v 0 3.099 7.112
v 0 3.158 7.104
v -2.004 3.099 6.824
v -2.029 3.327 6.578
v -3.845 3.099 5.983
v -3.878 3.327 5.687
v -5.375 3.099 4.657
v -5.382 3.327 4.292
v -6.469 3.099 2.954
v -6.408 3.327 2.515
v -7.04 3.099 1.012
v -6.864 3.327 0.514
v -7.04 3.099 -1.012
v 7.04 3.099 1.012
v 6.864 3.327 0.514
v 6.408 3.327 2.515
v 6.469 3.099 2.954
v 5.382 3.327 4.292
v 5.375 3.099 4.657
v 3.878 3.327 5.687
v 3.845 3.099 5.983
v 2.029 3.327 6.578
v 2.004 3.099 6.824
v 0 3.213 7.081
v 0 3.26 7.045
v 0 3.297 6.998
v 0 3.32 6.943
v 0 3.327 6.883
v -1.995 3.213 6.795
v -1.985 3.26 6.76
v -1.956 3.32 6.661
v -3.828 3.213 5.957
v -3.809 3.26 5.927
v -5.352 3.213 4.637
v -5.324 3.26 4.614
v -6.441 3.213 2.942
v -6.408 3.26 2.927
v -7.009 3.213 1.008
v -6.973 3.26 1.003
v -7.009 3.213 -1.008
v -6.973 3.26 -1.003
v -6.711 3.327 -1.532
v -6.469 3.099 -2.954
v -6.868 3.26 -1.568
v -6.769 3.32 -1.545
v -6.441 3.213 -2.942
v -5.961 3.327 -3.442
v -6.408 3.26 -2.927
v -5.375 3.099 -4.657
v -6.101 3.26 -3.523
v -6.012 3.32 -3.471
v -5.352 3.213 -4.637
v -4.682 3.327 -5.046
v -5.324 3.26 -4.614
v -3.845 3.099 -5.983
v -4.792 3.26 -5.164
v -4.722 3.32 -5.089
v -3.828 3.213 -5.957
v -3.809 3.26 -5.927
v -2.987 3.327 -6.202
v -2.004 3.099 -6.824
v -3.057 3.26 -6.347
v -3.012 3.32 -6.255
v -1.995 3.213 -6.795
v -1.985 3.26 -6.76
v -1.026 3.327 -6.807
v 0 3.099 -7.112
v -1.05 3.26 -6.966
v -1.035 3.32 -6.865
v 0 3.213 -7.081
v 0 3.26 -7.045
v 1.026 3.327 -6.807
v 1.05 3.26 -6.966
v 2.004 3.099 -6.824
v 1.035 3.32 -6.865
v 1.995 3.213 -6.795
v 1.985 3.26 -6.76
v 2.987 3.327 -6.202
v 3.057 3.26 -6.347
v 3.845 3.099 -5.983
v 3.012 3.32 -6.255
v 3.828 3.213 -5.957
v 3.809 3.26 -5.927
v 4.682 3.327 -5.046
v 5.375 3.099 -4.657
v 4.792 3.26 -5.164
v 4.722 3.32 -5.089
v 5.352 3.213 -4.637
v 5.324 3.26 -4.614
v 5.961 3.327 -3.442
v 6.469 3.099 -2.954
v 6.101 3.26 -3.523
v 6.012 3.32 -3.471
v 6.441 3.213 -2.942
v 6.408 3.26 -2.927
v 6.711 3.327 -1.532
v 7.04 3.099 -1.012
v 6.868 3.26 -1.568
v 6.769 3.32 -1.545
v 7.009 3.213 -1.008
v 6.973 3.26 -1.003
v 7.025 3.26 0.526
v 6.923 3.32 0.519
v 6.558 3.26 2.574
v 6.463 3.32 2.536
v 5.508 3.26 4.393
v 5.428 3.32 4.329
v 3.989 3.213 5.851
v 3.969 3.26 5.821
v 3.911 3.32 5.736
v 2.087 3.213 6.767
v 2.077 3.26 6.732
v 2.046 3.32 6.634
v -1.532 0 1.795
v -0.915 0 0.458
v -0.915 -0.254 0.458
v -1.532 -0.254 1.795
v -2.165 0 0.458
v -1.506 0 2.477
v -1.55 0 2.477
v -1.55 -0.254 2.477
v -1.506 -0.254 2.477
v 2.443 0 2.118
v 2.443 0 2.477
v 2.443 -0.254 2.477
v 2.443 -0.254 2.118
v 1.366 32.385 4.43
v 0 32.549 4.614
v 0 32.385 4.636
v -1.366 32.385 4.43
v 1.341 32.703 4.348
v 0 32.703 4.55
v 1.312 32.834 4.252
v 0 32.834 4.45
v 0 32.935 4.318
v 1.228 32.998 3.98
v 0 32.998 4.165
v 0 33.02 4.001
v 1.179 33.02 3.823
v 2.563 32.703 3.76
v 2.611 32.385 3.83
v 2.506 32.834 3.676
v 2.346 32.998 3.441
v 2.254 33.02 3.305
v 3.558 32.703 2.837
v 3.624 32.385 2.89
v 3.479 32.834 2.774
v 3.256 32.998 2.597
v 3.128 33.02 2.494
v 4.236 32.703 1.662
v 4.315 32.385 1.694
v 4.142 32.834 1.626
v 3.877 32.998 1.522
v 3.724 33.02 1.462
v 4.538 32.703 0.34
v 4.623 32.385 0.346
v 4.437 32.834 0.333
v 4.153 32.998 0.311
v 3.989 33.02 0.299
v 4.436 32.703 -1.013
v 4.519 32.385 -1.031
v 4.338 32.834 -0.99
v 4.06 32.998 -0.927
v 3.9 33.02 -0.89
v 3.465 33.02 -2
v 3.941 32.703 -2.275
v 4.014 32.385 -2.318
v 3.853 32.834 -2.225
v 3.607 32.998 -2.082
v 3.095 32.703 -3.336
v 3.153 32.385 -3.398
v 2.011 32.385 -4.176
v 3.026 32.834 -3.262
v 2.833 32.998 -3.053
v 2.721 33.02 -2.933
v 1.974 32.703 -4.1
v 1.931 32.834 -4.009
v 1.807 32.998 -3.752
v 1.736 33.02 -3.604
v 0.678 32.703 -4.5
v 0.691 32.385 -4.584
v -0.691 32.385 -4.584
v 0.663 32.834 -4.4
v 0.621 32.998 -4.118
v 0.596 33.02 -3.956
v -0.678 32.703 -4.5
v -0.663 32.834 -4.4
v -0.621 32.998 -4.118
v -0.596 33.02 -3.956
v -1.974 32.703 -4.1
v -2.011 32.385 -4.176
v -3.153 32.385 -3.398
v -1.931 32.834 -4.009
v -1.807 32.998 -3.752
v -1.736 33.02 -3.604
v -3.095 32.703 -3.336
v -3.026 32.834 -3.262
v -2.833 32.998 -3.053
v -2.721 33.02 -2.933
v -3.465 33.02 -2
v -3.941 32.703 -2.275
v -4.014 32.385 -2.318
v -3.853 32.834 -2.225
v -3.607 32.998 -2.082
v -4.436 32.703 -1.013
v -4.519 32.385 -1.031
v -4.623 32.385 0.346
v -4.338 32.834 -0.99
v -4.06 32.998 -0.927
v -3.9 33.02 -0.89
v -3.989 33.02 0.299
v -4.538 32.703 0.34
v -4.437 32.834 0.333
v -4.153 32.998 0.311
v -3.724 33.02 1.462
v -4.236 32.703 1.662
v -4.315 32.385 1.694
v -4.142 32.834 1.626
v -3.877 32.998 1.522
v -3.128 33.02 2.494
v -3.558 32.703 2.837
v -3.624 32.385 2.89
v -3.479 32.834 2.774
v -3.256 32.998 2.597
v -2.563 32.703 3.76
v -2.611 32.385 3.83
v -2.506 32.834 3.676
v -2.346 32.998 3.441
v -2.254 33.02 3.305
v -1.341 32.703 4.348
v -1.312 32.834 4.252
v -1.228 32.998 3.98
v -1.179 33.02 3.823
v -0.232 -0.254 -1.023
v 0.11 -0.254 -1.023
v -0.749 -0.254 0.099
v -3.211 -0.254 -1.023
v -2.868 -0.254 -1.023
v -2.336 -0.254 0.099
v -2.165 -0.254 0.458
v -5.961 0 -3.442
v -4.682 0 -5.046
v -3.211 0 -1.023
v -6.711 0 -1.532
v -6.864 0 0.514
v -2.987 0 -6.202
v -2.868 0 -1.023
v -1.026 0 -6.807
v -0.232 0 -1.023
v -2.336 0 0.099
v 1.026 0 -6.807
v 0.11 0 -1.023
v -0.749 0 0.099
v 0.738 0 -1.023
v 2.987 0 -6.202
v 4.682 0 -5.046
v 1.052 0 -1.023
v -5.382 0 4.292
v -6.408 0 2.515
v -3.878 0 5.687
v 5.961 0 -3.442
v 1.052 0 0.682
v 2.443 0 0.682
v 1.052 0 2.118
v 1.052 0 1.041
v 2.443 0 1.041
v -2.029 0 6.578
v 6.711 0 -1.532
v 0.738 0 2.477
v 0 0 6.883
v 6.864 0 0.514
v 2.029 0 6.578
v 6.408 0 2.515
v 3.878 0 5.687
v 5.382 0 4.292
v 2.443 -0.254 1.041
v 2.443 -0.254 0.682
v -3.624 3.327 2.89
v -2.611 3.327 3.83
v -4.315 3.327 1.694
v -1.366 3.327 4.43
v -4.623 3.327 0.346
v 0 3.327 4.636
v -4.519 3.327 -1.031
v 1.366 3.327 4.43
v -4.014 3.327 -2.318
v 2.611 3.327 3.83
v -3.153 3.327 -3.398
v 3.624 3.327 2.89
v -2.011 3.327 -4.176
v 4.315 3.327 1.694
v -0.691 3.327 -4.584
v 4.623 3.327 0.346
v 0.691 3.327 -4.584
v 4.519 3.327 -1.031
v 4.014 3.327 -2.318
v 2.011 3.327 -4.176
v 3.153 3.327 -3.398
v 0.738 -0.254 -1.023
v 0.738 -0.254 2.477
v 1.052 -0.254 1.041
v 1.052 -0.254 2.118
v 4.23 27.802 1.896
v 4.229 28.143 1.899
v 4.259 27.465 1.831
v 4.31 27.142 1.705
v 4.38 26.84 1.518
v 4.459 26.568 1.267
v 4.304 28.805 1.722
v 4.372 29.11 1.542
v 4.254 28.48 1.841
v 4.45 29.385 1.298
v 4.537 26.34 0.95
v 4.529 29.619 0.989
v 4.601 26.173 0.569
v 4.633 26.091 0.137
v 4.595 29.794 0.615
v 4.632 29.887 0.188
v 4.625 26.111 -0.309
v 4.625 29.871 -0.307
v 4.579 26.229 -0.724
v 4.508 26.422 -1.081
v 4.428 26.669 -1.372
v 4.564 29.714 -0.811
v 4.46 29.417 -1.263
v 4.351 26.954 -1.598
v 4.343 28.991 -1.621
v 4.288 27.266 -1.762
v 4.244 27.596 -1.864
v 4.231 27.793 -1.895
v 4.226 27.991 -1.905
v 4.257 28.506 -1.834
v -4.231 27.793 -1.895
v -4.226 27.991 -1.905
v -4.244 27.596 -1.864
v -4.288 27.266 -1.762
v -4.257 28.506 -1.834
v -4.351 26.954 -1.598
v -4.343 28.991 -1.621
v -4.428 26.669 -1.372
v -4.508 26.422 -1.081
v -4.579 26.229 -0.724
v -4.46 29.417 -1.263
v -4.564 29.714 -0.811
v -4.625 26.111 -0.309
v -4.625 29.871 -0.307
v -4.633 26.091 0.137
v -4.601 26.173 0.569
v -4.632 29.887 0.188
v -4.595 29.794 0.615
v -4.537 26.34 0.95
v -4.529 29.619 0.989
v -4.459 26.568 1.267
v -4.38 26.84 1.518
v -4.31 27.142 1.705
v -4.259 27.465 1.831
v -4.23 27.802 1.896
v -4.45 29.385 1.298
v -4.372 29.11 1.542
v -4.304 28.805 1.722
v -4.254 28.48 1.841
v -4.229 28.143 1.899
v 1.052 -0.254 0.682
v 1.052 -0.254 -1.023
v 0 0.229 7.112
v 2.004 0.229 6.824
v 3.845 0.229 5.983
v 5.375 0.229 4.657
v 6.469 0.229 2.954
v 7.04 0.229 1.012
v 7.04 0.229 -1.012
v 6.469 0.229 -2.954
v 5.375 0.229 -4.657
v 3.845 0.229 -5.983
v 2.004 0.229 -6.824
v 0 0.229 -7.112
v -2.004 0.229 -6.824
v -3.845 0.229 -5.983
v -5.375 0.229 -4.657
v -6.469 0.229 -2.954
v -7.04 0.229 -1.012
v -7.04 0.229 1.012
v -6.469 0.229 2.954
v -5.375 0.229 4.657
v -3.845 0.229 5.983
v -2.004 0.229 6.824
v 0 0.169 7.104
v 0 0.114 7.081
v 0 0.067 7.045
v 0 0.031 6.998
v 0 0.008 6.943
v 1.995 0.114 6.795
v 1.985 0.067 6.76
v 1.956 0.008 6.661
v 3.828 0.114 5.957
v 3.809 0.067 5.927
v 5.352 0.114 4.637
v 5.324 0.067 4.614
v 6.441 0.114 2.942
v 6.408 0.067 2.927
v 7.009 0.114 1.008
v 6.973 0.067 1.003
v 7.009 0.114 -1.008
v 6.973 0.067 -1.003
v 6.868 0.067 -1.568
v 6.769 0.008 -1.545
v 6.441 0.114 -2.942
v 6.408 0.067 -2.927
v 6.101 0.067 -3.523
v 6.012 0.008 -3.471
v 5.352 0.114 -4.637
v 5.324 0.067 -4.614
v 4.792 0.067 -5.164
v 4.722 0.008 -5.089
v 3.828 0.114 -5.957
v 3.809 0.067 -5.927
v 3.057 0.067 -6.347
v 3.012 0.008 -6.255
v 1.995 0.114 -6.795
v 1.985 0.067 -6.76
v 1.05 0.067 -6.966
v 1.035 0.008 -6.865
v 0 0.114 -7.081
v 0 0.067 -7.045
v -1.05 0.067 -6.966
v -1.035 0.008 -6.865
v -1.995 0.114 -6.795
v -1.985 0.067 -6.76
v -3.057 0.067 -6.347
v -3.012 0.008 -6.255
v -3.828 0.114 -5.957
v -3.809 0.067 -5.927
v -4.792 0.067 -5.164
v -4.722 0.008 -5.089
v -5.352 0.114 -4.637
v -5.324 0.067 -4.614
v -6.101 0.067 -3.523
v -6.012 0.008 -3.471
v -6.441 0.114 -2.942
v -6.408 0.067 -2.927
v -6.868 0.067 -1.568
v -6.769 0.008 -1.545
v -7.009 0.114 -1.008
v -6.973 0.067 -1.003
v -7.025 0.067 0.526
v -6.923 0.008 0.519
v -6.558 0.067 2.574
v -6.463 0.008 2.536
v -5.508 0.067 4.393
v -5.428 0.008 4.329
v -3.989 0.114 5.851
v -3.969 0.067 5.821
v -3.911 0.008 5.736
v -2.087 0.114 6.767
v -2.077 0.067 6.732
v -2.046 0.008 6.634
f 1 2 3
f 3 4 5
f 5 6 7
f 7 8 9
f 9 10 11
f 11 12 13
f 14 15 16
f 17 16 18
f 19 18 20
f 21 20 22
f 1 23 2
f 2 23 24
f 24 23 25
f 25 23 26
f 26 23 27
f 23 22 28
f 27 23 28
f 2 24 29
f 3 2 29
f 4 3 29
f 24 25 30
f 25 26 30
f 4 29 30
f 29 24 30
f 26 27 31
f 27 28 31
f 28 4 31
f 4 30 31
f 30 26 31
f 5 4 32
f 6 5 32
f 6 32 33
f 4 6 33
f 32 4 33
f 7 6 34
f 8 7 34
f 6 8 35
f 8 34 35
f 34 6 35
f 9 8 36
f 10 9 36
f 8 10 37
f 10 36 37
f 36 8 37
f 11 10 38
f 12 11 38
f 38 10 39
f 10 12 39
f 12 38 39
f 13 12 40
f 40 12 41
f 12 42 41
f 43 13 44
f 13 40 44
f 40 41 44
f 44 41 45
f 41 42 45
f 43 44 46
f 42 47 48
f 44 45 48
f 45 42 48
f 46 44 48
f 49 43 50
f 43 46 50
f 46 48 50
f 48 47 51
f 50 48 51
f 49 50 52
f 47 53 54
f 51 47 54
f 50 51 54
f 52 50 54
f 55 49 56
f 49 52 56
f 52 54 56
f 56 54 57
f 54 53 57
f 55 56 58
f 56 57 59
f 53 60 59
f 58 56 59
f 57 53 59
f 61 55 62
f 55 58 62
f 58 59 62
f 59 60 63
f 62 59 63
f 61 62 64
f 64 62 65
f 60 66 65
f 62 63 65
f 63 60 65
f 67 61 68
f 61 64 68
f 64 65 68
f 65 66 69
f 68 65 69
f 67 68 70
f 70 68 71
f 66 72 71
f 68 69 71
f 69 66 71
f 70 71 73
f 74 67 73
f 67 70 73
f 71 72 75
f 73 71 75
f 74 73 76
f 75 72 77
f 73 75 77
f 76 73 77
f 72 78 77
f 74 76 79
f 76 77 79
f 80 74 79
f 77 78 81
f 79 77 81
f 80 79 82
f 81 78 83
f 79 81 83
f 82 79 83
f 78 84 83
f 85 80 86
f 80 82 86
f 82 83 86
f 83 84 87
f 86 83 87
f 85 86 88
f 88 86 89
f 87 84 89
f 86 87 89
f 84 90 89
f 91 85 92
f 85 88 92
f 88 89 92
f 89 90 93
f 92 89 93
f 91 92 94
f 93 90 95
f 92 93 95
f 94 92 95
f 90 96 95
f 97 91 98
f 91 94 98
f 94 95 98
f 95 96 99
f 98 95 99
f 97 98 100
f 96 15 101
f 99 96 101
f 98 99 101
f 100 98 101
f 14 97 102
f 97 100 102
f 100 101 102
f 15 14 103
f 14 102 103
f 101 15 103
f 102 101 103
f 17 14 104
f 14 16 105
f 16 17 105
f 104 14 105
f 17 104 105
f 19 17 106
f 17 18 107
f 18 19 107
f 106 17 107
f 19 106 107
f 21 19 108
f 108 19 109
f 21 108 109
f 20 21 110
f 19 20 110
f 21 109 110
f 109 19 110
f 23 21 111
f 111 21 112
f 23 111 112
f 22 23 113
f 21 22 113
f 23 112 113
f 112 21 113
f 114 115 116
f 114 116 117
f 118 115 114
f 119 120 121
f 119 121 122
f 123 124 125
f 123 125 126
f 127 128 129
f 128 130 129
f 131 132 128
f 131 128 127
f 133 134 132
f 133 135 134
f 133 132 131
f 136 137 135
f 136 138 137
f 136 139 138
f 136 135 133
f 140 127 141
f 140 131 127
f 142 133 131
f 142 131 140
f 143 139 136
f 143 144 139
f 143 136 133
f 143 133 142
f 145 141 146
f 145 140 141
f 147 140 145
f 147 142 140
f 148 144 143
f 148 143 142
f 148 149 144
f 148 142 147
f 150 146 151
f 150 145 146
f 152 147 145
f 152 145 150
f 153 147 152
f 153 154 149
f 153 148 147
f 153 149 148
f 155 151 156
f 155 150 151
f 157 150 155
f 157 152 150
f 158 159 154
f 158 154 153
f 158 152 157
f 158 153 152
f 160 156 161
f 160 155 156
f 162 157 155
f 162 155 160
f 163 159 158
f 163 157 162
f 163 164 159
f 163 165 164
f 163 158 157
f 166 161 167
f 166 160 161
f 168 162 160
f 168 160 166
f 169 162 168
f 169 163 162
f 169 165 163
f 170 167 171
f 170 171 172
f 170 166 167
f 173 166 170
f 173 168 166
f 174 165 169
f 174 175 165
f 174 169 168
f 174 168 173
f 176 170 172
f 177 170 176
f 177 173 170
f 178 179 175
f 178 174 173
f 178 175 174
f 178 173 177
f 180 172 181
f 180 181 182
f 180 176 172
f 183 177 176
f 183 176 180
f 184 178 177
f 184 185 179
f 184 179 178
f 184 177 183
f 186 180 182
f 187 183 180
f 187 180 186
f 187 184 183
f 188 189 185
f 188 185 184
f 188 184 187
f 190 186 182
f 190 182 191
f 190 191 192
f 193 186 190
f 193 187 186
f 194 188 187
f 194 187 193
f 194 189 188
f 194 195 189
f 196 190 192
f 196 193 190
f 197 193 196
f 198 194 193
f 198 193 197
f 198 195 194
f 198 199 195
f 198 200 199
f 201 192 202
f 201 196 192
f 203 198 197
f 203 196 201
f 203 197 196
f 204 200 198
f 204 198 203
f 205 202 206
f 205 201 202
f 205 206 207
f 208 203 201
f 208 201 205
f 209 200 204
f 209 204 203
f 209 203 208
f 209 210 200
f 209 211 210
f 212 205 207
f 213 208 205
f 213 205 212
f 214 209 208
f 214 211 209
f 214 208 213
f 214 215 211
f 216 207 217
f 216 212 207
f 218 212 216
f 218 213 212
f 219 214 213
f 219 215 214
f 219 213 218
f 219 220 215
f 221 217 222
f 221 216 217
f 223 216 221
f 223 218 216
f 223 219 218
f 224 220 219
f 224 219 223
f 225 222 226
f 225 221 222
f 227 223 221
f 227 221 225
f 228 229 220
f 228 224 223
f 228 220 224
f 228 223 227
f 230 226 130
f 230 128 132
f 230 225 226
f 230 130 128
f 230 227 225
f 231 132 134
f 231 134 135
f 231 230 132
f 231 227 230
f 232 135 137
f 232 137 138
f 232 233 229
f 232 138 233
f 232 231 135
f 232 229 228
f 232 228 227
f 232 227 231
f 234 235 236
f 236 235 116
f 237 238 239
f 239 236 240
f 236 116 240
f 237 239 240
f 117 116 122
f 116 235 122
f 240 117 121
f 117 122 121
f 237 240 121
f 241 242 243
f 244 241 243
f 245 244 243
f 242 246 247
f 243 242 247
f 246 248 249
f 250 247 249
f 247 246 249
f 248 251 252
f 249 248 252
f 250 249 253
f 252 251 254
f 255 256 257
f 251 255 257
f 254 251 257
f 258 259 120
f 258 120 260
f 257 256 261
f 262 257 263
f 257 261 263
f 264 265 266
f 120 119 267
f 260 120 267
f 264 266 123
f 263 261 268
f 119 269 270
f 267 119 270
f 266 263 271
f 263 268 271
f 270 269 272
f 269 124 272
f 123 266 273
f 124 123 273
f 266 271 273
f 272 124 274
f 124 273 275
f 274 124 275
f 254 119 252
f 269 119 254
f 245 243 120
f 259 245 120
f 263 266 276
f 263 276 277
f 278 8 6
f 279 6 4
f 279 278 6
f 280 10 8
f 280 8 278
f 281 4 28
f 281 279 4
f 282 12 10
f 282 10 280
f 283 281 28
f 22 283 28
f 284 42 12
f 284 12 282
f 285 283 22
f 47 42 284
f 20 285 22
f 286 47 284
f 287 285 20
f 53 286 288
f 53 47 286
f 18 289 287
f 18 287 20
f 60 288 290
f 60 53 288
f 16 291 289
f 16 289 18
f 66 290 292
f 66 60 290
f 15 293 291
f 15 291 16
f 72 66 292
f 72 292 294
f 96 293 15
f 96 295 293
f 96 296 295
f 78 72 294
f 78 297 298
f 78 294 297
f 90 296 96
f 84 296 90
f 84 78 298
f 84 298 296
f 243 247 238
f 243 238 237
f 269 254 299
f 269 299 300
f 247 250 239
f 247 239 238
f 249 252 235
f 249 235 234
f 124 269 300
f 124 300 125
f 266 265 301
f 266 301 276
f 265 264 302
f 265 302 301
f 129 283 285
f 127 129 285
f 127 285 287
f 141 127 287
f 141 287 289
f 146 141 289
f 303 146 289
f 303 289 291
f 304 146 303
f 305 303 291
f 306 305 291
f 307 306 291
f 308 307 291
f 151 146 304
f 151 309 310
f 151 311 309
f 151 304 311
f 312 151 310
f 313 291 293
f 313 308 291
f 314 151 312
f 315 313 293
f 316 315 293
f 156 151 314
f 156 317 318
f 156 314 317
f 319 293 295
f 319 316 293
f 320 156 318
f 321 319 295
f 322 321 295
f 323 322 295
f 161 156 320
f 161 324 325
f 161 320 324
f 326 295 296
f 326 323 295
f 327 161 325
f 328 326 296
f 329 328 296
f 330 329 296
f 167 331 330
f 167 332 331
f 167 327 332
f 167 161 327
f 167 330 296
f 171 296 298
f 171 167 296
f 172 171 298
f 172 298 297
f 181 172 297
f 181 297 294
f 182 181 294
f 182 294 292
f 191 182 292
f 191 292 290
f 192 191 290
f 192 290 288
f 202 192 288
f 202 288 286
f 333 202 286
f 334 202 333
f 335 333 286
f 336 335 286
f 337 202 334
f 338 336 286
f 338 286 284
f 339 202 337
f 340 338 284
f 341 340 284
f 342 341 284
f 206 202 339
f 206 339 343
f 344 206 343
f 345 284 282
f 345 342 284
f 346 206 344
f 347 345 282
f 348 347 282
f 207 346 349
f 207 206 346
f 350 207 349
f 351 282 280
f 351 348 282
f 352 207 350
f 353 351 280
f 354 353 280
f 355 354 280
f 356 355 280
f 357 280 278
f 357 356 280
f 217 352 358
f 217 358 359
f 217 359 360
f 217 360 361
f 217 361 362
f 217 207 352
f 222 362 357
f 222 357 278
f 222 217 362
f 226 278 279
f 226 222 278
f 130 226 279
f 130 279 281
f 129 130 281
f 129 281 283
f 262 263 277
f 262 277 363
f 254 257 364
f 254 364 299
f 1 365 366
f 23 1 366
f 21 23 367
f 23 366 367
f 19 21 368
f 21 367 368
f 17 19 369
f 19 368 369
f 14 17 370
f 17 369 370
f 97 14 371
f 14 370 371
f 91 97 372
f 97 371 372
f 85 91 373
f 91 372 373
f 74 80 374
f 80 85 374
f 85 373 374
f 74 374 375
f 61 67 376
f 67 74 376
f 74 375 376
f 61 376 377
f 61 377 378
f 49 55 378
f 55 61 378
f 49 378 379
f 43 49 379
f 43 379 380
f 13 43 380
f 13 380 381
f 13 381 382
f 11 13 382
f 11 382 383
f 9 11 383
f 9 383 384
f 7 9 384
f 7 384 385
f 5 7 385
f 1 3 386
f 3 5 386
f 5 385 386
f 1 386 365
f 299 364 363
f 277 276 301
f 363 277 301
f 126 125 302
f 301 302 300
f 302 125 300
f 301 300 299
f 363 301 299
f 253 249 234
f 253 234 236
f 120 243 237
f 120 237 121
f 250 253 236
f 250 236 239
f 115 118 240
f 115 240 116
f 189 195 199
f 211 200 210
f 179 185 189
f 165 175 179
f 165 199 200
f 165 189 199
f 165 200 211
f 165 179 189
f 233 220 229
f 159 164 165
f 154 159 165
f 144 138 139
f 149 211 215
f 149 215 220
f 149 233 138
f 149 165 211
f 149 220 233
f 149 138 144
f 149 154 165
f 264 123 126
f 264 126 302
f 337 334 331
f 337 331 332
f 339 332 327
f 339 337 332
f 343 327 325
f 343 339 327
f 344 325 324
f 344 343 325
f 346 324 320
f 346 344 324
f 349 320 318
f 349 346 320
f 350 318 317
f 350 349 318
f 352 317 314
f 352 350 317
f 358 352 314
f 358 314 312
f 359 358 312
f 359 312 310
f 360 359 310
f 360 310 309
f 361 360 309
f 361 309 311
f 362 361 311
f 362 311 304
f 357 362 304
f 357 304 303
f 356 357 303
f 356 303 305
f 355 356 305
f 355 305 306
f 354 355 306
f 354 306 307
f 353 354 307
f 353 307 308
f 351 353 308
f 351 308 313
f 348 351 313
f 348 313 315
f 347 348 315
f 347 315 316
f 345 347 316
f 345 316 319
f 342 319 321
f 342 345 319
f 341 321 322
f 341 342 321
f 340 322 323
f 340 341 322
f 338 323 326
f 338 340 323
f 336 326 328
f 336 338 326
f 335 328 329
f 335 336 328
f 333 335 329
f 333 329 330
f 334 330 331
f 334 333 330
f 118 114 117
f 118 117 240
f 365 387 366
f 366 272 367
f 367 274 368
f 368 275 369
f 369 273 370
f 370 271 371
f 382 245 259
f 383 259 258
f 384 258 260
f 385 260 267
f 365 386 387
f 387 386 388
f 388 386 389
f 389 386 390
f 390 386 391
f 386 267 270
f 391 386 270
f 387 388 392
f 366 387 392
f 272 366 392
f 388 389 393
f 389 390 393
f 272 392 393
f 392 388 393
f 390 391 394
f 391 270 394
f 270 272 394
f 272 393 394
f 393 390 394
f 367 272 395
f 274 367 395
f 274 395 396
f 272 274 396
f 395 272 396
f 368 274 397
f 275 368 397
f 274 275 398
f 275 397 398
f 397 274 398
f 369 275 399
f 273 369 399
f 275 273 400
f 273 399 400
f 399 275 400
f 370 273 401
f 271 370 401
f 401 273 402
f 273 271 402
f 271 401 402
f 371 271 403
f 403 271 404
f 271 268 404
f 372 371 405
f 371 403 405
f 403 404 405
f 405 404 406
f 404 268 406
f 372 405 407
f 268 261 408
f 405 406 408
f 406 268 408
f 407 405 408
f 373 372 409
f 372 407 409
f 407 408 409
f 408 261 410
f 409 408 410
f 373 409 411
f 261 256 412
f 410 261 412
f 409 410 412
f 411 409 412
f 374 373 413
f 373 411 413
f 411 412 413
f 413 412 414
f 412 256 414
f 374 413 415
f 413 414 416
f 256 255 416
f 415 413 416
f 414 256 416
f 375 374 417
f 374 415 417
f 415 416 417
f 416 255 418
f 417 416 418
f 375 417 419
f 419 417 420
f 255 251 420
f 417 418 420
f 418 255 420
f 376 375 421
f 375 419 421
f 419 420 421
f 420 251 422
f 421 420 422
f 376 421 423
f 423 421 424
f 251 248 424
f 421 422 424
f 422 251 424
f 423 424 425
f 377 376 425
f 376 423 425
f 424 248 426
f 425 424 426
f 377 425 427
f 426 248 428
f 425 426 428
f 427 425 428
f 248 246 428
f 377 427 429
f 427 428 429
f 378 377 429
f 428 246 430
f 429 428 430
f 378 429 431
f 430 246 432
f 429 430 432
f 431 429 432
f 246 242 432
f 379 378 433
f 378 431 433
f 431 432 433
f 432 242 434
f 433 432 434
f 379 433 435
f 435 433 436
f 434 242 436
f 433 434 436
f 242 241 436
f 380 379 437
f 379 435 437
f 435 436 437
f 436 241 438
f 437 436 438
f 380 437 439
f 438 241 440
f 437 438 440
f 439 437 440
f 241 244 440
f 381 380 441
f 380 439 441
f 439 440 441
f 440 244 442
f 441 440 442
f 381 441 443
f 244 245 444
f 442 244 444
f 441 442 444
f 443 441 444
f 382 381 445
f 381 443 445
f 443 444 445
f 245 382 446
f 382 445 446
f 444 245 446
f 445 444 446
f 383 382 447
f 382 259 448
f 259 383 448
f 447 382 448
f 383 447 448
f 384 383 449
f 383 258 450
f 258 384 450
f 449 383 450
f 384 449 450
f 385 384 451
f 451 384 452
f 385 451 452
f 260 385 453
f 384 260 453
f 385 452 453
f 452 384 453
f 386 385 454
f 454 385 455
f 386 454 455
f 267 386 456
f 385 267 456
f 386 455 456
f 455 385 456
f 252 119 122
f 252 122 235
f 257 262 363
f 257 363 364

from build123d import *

# Parameters (mm, degrees)
SKETCH1_R               = 7.112
BOSS_EXTRUDE1_DEPTH     = 33.02
SKETCH2_OUTSIDE_W       = 23.956
SKETCH2_OUTSIDE_H       = 23.956
SKETCH2_OUTSIDE_R       = 4.6355
CUT_EXTRUDE1_DEPTH      = 29.6926
CUT_EXTRUDE2_DEPTH      = 35.517843038
CUT_EXTRUDE2_DEPTH_BACK = 35.517843038
SKETCH3_R               = 1.905
BOSS_EXTRUDE2_DEPTH     = 0.254
FILLET1_R               = 0.2286
FILLET2_R               = 0.635


with BuildPart() as part:
    # Sketch1 → Boss-Extrude1 (new body)
    with BuildSketch(Plane(origin=(0, 0, 0), x_dir=(1, 0, 0), z_dir=(0, 1, 0))):
        with Locations(Location((0, 0, 0), (0, 0, 270))):
            Circle(SKETCH1_R)
    extrude(amount=BOSS_EXTRUDE1_DEPTH)

    # Sketch2 outside → Cut-Extrude1 (cut)
    with BuildSketch(Plane(origin=(0, 33.02, 0), x_dir=(1, 0, 0), z_dir=(0, 1, 0))):
        Rectangle(SKETCH2_OUTSIDE_W, SKETCH2_OUTSIDE_H)
        with Locations(Location((0, 0, 0), (0, 0, 270))):
            Circle(SKETCH2_OUTSIDE_R, mode=Mode.SUBTRACT)
    extrude(amount=-CUT_EXTRUDE1_DEPTH, mode=Mode.SUBTRACT)

    # Sketch3 → Cut-Extrude2 (cut, two sides: drawn at the far end of the back side and taken through both)
    with BuildSketch(Plane(origin=(0, 0, 0), x_dir=(0, 0, -1), z_dir=(1, 0, 0)).offset(-CUT_EXTRUDE2_DEPTH_BACK)):
        with Locations((0, 27.9908)):
            Circle(SKETCH3_R)
    extrude(amount=CUT_EXTRUDE2_DEPTH + CUT_EXTRUDE2_DEPTH_BACK, mode=Mode.SUBTRACT)

    # Sketch4 → Boss-Extrude2 (add)
    # profile 1 of 2: a face of its own
    with BuildSketch(Plane.XZ):
        Polygon((-1.505619488, 2.477183377), (0.109765127, -1.022816623), (-0.231681187, -1.022816623), (-0.749109071, 0.098978249), (-2.335747693, 0.098978249), (-2.867899135, -1.022816623), (-3.210747693, -1.022816623), (-1.550491283, 2.477183377), align=None)
        Polygon((-1.531560994, 1.794991871), (-2.165375097, 0.457952608), (-0.914573815, 0.457952608), align=None, mode=Mode.SUBTRACT)
    # profile 2 of 2: a face of its own
    with BuildSketch(Plane.XZ):
        Polygon((0.737970256, 2.477183377), (2.443098461, 2.477183377), (2.443098461, 2.118209018), (1.05207282, 2.118209018), (1.05207282, 1.041285942), (2.443098461, 1.041285942), (2.443098461, 0.682311583), (1.05207282, 0.682311583), (1.05207282, -1.022816623), (0.737970256, -1.022816623), align=None)
    extrude(amount=BOSS_EXTRUDE2_DEPTH)

    # Fillet1
    fillet1_edges = [part.edges().sort_by_distance(p)[0] for p in [
        (0, 0, -7.112),
        (0, 3.3274, -7.112),
    ]]
    fillet(fillet1_edges, radius=FILLET1_R)

    # Fillet2
    fillet2_edges = [part.edges().sort_by_distance(p)[0] for p in [
        (0, 33.02, -4.6355),
    ]]
    fillet(fillet2_edges, radius=FILLET2_R)


solid = part.part
